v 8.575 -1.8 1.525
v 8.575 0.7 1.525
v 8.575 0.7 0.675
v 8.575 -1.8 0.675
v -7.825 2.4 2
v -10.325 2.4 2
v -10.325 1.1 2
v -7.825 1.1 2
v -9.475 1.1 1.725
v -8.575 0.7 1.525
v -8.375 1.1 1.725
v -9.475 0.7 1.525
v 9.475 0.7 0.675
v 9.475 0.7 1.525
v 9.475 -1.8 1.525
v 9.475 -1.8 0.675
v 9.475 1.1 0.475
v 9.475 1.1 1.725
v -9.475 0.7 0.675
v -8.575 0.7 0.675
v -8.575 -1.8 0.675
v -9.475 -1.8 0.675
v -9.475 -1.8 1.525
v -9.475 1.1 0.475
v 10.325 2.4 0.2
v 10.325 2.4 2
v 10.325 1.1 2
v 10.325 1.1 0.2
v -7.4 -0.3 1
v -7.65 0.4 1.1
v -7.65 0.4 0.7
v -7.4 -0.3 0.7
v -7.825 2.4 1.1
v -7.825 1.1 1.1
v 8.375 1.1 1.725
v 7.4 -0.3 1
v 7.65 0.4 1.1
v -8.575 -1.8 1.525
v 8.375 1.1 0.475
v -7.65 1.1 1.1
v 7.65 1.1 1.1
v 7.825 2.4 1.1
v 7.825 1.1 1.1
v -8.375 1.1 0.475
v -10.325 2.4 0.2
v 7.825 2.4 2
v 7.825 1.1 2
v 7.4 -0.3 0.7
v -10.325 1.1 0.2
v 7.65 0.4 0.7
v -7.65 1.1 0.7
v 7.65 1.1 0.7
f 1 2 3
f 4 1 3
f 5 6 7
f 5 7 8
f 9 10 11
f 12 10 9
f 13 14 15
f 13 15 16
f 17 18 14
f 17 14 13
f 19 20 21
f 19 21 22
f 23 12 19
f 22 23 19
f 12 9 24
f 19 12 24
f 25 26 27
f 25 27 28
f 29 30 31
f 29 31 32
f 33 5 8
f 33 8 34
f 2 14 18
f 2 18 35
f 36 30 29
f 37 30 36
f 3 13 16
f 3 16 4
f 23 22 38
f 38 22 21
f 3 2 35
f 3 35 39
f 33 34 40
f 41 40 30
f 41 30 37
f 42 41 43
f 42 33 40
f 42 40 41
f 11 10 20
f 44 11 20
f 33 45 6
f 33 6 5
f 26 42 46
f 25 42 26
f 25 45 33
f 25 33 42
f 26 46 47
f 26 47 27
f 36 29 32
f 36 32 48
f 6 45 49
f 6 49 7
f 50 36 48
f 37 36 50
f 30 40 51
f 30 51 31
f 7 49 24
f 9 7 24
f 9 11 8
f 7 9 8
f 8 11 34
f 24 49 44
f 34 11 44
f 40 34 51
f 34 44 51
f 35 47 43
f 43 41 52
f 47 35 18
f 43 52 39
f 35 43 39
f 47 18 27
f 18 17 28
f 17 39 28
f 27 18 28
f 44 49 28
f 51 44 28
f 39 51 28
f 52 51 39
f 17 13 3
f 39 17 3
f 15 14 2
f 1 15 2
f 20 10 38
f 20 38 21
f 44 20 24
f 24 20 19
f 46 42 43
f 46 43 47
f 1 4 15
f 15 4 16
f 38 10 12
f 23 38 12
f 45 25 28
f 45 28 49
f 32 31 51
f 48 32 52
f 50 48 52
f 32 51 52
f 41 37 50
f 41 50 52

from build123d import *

# Parameters (mm, degrees)
PAD011_DEPTH              = 0.4
CHAMFER001_SIZE2          = 0.7
CHAMFER001_SIZE           = 0.1
SKETCH012_W               = 0.9
SKETCH012_H               = 0.85
PAD012_DEPTH              = 3
PAD010_DEPTH              = 4.2
CHAMFER_SIZE2             = 0.4
CHAMFER_SIZE              = 0.2
FUSION001_PLACEMENT_ANGLE = 180


with BuildPart() as chamfer001:
    # Sketch011 → Pad011 (new body)
    with BuildSketch(Plane.XY.offset(0.9)):
        Polygon((-7.65, 0), (7.65, 0), (7.65, -0.7), (7.4, -1.4), (-7.4, -1.4), (-7.65, -0.7), align=None)
    extrude(amount=PAD011_DEPTH)

    # Chamfer001
    chamfer001_edges = [chamfer001.edges().sort_by_distance(p)[0] for p in [
        (0, -1.4, 0.9),
    ]]
    chamfer001_side = chamfer001.faces().sort_by_distance((0, -1.4, 1.1))[0]
    chamfer(chamfer001_edges, length=CHAMFER001_SIZE, length2=CHAMFER001_SIZE2, reference=chamfer001_side)


with BuildPart() as body012:
    # Sketch012 → Pad012 (new body)
    with BuildSketch(Plane.XZ):
        Polygon((-10.325, 0), (-10.325, 1.8), (10.325, 1.8), (10.325, 0), (7.825, 0), (7.825, 0.9), (-7.825, 0.9), (-7.825, 0), align=None)
        with Locations((-9.025, 0.9)):
            Rectangle(SKETCH012_W, SKETCH012_H, mode=Mode.SUBTRACT)
        with Locations((9.025, 0.9)):
            Rectangle(SKETCH012_W, SKETCH012_H, mode=Mode.SUBTRACT)
    extrude(amount=PAD012_DEPTH)


with BuildPart() as fusion001:
    # Sketch010 → Pad010 (new body)
    with BuildSketch(Plane.XZ.offset(-1.3)):
        Polygon((-10.325, 0), (-10.325, 1.8), (10.325, 1.8), (10.325, 0), (7.825, 0), (7.825, 0.9), (-7.825, 0.9), (-7.825, 0), align=None)
    extrude(amount=PAD010_DEPTH)

    # Cut002: cut Body012
    add(body012.part, mode=Mode.SUBTRACT)

    # Chamfer
    chamfer_edges = [fusion001.edges().sort_by_distance(p)[0] for p in [
        (8.575, 0, 0.9),
        (9.025, 0, 0.475),
        (9.025, 0, 1.325),
        (-9.025, 0, 0.475),
        (-9.025, 0, 1.325),
        (-8.575, 0, 0.9),
    ]]
    chamfer_side = fusion001.faces().sort_by_distance((0, 0, 1.19405))[0]
    chamfer(chamfer_edges, length=CHAMFER_SIZE, length2=CHAMFER_SIZE2, reference=chamfer_side)

    # Fusion001: union Chamfer001
    add(chamfer001.part)


with BuildPart() as fusion001_1:
    # Fusion001 placement: moved
    add(fusion001.part.moved(Location((0, 1.1, 2))).rotate(Axis((0, 1.1, 2), (0, 1, 0)), FUSION001_PLACEMENT_ANGLE))


solid = fusion001_1.part
